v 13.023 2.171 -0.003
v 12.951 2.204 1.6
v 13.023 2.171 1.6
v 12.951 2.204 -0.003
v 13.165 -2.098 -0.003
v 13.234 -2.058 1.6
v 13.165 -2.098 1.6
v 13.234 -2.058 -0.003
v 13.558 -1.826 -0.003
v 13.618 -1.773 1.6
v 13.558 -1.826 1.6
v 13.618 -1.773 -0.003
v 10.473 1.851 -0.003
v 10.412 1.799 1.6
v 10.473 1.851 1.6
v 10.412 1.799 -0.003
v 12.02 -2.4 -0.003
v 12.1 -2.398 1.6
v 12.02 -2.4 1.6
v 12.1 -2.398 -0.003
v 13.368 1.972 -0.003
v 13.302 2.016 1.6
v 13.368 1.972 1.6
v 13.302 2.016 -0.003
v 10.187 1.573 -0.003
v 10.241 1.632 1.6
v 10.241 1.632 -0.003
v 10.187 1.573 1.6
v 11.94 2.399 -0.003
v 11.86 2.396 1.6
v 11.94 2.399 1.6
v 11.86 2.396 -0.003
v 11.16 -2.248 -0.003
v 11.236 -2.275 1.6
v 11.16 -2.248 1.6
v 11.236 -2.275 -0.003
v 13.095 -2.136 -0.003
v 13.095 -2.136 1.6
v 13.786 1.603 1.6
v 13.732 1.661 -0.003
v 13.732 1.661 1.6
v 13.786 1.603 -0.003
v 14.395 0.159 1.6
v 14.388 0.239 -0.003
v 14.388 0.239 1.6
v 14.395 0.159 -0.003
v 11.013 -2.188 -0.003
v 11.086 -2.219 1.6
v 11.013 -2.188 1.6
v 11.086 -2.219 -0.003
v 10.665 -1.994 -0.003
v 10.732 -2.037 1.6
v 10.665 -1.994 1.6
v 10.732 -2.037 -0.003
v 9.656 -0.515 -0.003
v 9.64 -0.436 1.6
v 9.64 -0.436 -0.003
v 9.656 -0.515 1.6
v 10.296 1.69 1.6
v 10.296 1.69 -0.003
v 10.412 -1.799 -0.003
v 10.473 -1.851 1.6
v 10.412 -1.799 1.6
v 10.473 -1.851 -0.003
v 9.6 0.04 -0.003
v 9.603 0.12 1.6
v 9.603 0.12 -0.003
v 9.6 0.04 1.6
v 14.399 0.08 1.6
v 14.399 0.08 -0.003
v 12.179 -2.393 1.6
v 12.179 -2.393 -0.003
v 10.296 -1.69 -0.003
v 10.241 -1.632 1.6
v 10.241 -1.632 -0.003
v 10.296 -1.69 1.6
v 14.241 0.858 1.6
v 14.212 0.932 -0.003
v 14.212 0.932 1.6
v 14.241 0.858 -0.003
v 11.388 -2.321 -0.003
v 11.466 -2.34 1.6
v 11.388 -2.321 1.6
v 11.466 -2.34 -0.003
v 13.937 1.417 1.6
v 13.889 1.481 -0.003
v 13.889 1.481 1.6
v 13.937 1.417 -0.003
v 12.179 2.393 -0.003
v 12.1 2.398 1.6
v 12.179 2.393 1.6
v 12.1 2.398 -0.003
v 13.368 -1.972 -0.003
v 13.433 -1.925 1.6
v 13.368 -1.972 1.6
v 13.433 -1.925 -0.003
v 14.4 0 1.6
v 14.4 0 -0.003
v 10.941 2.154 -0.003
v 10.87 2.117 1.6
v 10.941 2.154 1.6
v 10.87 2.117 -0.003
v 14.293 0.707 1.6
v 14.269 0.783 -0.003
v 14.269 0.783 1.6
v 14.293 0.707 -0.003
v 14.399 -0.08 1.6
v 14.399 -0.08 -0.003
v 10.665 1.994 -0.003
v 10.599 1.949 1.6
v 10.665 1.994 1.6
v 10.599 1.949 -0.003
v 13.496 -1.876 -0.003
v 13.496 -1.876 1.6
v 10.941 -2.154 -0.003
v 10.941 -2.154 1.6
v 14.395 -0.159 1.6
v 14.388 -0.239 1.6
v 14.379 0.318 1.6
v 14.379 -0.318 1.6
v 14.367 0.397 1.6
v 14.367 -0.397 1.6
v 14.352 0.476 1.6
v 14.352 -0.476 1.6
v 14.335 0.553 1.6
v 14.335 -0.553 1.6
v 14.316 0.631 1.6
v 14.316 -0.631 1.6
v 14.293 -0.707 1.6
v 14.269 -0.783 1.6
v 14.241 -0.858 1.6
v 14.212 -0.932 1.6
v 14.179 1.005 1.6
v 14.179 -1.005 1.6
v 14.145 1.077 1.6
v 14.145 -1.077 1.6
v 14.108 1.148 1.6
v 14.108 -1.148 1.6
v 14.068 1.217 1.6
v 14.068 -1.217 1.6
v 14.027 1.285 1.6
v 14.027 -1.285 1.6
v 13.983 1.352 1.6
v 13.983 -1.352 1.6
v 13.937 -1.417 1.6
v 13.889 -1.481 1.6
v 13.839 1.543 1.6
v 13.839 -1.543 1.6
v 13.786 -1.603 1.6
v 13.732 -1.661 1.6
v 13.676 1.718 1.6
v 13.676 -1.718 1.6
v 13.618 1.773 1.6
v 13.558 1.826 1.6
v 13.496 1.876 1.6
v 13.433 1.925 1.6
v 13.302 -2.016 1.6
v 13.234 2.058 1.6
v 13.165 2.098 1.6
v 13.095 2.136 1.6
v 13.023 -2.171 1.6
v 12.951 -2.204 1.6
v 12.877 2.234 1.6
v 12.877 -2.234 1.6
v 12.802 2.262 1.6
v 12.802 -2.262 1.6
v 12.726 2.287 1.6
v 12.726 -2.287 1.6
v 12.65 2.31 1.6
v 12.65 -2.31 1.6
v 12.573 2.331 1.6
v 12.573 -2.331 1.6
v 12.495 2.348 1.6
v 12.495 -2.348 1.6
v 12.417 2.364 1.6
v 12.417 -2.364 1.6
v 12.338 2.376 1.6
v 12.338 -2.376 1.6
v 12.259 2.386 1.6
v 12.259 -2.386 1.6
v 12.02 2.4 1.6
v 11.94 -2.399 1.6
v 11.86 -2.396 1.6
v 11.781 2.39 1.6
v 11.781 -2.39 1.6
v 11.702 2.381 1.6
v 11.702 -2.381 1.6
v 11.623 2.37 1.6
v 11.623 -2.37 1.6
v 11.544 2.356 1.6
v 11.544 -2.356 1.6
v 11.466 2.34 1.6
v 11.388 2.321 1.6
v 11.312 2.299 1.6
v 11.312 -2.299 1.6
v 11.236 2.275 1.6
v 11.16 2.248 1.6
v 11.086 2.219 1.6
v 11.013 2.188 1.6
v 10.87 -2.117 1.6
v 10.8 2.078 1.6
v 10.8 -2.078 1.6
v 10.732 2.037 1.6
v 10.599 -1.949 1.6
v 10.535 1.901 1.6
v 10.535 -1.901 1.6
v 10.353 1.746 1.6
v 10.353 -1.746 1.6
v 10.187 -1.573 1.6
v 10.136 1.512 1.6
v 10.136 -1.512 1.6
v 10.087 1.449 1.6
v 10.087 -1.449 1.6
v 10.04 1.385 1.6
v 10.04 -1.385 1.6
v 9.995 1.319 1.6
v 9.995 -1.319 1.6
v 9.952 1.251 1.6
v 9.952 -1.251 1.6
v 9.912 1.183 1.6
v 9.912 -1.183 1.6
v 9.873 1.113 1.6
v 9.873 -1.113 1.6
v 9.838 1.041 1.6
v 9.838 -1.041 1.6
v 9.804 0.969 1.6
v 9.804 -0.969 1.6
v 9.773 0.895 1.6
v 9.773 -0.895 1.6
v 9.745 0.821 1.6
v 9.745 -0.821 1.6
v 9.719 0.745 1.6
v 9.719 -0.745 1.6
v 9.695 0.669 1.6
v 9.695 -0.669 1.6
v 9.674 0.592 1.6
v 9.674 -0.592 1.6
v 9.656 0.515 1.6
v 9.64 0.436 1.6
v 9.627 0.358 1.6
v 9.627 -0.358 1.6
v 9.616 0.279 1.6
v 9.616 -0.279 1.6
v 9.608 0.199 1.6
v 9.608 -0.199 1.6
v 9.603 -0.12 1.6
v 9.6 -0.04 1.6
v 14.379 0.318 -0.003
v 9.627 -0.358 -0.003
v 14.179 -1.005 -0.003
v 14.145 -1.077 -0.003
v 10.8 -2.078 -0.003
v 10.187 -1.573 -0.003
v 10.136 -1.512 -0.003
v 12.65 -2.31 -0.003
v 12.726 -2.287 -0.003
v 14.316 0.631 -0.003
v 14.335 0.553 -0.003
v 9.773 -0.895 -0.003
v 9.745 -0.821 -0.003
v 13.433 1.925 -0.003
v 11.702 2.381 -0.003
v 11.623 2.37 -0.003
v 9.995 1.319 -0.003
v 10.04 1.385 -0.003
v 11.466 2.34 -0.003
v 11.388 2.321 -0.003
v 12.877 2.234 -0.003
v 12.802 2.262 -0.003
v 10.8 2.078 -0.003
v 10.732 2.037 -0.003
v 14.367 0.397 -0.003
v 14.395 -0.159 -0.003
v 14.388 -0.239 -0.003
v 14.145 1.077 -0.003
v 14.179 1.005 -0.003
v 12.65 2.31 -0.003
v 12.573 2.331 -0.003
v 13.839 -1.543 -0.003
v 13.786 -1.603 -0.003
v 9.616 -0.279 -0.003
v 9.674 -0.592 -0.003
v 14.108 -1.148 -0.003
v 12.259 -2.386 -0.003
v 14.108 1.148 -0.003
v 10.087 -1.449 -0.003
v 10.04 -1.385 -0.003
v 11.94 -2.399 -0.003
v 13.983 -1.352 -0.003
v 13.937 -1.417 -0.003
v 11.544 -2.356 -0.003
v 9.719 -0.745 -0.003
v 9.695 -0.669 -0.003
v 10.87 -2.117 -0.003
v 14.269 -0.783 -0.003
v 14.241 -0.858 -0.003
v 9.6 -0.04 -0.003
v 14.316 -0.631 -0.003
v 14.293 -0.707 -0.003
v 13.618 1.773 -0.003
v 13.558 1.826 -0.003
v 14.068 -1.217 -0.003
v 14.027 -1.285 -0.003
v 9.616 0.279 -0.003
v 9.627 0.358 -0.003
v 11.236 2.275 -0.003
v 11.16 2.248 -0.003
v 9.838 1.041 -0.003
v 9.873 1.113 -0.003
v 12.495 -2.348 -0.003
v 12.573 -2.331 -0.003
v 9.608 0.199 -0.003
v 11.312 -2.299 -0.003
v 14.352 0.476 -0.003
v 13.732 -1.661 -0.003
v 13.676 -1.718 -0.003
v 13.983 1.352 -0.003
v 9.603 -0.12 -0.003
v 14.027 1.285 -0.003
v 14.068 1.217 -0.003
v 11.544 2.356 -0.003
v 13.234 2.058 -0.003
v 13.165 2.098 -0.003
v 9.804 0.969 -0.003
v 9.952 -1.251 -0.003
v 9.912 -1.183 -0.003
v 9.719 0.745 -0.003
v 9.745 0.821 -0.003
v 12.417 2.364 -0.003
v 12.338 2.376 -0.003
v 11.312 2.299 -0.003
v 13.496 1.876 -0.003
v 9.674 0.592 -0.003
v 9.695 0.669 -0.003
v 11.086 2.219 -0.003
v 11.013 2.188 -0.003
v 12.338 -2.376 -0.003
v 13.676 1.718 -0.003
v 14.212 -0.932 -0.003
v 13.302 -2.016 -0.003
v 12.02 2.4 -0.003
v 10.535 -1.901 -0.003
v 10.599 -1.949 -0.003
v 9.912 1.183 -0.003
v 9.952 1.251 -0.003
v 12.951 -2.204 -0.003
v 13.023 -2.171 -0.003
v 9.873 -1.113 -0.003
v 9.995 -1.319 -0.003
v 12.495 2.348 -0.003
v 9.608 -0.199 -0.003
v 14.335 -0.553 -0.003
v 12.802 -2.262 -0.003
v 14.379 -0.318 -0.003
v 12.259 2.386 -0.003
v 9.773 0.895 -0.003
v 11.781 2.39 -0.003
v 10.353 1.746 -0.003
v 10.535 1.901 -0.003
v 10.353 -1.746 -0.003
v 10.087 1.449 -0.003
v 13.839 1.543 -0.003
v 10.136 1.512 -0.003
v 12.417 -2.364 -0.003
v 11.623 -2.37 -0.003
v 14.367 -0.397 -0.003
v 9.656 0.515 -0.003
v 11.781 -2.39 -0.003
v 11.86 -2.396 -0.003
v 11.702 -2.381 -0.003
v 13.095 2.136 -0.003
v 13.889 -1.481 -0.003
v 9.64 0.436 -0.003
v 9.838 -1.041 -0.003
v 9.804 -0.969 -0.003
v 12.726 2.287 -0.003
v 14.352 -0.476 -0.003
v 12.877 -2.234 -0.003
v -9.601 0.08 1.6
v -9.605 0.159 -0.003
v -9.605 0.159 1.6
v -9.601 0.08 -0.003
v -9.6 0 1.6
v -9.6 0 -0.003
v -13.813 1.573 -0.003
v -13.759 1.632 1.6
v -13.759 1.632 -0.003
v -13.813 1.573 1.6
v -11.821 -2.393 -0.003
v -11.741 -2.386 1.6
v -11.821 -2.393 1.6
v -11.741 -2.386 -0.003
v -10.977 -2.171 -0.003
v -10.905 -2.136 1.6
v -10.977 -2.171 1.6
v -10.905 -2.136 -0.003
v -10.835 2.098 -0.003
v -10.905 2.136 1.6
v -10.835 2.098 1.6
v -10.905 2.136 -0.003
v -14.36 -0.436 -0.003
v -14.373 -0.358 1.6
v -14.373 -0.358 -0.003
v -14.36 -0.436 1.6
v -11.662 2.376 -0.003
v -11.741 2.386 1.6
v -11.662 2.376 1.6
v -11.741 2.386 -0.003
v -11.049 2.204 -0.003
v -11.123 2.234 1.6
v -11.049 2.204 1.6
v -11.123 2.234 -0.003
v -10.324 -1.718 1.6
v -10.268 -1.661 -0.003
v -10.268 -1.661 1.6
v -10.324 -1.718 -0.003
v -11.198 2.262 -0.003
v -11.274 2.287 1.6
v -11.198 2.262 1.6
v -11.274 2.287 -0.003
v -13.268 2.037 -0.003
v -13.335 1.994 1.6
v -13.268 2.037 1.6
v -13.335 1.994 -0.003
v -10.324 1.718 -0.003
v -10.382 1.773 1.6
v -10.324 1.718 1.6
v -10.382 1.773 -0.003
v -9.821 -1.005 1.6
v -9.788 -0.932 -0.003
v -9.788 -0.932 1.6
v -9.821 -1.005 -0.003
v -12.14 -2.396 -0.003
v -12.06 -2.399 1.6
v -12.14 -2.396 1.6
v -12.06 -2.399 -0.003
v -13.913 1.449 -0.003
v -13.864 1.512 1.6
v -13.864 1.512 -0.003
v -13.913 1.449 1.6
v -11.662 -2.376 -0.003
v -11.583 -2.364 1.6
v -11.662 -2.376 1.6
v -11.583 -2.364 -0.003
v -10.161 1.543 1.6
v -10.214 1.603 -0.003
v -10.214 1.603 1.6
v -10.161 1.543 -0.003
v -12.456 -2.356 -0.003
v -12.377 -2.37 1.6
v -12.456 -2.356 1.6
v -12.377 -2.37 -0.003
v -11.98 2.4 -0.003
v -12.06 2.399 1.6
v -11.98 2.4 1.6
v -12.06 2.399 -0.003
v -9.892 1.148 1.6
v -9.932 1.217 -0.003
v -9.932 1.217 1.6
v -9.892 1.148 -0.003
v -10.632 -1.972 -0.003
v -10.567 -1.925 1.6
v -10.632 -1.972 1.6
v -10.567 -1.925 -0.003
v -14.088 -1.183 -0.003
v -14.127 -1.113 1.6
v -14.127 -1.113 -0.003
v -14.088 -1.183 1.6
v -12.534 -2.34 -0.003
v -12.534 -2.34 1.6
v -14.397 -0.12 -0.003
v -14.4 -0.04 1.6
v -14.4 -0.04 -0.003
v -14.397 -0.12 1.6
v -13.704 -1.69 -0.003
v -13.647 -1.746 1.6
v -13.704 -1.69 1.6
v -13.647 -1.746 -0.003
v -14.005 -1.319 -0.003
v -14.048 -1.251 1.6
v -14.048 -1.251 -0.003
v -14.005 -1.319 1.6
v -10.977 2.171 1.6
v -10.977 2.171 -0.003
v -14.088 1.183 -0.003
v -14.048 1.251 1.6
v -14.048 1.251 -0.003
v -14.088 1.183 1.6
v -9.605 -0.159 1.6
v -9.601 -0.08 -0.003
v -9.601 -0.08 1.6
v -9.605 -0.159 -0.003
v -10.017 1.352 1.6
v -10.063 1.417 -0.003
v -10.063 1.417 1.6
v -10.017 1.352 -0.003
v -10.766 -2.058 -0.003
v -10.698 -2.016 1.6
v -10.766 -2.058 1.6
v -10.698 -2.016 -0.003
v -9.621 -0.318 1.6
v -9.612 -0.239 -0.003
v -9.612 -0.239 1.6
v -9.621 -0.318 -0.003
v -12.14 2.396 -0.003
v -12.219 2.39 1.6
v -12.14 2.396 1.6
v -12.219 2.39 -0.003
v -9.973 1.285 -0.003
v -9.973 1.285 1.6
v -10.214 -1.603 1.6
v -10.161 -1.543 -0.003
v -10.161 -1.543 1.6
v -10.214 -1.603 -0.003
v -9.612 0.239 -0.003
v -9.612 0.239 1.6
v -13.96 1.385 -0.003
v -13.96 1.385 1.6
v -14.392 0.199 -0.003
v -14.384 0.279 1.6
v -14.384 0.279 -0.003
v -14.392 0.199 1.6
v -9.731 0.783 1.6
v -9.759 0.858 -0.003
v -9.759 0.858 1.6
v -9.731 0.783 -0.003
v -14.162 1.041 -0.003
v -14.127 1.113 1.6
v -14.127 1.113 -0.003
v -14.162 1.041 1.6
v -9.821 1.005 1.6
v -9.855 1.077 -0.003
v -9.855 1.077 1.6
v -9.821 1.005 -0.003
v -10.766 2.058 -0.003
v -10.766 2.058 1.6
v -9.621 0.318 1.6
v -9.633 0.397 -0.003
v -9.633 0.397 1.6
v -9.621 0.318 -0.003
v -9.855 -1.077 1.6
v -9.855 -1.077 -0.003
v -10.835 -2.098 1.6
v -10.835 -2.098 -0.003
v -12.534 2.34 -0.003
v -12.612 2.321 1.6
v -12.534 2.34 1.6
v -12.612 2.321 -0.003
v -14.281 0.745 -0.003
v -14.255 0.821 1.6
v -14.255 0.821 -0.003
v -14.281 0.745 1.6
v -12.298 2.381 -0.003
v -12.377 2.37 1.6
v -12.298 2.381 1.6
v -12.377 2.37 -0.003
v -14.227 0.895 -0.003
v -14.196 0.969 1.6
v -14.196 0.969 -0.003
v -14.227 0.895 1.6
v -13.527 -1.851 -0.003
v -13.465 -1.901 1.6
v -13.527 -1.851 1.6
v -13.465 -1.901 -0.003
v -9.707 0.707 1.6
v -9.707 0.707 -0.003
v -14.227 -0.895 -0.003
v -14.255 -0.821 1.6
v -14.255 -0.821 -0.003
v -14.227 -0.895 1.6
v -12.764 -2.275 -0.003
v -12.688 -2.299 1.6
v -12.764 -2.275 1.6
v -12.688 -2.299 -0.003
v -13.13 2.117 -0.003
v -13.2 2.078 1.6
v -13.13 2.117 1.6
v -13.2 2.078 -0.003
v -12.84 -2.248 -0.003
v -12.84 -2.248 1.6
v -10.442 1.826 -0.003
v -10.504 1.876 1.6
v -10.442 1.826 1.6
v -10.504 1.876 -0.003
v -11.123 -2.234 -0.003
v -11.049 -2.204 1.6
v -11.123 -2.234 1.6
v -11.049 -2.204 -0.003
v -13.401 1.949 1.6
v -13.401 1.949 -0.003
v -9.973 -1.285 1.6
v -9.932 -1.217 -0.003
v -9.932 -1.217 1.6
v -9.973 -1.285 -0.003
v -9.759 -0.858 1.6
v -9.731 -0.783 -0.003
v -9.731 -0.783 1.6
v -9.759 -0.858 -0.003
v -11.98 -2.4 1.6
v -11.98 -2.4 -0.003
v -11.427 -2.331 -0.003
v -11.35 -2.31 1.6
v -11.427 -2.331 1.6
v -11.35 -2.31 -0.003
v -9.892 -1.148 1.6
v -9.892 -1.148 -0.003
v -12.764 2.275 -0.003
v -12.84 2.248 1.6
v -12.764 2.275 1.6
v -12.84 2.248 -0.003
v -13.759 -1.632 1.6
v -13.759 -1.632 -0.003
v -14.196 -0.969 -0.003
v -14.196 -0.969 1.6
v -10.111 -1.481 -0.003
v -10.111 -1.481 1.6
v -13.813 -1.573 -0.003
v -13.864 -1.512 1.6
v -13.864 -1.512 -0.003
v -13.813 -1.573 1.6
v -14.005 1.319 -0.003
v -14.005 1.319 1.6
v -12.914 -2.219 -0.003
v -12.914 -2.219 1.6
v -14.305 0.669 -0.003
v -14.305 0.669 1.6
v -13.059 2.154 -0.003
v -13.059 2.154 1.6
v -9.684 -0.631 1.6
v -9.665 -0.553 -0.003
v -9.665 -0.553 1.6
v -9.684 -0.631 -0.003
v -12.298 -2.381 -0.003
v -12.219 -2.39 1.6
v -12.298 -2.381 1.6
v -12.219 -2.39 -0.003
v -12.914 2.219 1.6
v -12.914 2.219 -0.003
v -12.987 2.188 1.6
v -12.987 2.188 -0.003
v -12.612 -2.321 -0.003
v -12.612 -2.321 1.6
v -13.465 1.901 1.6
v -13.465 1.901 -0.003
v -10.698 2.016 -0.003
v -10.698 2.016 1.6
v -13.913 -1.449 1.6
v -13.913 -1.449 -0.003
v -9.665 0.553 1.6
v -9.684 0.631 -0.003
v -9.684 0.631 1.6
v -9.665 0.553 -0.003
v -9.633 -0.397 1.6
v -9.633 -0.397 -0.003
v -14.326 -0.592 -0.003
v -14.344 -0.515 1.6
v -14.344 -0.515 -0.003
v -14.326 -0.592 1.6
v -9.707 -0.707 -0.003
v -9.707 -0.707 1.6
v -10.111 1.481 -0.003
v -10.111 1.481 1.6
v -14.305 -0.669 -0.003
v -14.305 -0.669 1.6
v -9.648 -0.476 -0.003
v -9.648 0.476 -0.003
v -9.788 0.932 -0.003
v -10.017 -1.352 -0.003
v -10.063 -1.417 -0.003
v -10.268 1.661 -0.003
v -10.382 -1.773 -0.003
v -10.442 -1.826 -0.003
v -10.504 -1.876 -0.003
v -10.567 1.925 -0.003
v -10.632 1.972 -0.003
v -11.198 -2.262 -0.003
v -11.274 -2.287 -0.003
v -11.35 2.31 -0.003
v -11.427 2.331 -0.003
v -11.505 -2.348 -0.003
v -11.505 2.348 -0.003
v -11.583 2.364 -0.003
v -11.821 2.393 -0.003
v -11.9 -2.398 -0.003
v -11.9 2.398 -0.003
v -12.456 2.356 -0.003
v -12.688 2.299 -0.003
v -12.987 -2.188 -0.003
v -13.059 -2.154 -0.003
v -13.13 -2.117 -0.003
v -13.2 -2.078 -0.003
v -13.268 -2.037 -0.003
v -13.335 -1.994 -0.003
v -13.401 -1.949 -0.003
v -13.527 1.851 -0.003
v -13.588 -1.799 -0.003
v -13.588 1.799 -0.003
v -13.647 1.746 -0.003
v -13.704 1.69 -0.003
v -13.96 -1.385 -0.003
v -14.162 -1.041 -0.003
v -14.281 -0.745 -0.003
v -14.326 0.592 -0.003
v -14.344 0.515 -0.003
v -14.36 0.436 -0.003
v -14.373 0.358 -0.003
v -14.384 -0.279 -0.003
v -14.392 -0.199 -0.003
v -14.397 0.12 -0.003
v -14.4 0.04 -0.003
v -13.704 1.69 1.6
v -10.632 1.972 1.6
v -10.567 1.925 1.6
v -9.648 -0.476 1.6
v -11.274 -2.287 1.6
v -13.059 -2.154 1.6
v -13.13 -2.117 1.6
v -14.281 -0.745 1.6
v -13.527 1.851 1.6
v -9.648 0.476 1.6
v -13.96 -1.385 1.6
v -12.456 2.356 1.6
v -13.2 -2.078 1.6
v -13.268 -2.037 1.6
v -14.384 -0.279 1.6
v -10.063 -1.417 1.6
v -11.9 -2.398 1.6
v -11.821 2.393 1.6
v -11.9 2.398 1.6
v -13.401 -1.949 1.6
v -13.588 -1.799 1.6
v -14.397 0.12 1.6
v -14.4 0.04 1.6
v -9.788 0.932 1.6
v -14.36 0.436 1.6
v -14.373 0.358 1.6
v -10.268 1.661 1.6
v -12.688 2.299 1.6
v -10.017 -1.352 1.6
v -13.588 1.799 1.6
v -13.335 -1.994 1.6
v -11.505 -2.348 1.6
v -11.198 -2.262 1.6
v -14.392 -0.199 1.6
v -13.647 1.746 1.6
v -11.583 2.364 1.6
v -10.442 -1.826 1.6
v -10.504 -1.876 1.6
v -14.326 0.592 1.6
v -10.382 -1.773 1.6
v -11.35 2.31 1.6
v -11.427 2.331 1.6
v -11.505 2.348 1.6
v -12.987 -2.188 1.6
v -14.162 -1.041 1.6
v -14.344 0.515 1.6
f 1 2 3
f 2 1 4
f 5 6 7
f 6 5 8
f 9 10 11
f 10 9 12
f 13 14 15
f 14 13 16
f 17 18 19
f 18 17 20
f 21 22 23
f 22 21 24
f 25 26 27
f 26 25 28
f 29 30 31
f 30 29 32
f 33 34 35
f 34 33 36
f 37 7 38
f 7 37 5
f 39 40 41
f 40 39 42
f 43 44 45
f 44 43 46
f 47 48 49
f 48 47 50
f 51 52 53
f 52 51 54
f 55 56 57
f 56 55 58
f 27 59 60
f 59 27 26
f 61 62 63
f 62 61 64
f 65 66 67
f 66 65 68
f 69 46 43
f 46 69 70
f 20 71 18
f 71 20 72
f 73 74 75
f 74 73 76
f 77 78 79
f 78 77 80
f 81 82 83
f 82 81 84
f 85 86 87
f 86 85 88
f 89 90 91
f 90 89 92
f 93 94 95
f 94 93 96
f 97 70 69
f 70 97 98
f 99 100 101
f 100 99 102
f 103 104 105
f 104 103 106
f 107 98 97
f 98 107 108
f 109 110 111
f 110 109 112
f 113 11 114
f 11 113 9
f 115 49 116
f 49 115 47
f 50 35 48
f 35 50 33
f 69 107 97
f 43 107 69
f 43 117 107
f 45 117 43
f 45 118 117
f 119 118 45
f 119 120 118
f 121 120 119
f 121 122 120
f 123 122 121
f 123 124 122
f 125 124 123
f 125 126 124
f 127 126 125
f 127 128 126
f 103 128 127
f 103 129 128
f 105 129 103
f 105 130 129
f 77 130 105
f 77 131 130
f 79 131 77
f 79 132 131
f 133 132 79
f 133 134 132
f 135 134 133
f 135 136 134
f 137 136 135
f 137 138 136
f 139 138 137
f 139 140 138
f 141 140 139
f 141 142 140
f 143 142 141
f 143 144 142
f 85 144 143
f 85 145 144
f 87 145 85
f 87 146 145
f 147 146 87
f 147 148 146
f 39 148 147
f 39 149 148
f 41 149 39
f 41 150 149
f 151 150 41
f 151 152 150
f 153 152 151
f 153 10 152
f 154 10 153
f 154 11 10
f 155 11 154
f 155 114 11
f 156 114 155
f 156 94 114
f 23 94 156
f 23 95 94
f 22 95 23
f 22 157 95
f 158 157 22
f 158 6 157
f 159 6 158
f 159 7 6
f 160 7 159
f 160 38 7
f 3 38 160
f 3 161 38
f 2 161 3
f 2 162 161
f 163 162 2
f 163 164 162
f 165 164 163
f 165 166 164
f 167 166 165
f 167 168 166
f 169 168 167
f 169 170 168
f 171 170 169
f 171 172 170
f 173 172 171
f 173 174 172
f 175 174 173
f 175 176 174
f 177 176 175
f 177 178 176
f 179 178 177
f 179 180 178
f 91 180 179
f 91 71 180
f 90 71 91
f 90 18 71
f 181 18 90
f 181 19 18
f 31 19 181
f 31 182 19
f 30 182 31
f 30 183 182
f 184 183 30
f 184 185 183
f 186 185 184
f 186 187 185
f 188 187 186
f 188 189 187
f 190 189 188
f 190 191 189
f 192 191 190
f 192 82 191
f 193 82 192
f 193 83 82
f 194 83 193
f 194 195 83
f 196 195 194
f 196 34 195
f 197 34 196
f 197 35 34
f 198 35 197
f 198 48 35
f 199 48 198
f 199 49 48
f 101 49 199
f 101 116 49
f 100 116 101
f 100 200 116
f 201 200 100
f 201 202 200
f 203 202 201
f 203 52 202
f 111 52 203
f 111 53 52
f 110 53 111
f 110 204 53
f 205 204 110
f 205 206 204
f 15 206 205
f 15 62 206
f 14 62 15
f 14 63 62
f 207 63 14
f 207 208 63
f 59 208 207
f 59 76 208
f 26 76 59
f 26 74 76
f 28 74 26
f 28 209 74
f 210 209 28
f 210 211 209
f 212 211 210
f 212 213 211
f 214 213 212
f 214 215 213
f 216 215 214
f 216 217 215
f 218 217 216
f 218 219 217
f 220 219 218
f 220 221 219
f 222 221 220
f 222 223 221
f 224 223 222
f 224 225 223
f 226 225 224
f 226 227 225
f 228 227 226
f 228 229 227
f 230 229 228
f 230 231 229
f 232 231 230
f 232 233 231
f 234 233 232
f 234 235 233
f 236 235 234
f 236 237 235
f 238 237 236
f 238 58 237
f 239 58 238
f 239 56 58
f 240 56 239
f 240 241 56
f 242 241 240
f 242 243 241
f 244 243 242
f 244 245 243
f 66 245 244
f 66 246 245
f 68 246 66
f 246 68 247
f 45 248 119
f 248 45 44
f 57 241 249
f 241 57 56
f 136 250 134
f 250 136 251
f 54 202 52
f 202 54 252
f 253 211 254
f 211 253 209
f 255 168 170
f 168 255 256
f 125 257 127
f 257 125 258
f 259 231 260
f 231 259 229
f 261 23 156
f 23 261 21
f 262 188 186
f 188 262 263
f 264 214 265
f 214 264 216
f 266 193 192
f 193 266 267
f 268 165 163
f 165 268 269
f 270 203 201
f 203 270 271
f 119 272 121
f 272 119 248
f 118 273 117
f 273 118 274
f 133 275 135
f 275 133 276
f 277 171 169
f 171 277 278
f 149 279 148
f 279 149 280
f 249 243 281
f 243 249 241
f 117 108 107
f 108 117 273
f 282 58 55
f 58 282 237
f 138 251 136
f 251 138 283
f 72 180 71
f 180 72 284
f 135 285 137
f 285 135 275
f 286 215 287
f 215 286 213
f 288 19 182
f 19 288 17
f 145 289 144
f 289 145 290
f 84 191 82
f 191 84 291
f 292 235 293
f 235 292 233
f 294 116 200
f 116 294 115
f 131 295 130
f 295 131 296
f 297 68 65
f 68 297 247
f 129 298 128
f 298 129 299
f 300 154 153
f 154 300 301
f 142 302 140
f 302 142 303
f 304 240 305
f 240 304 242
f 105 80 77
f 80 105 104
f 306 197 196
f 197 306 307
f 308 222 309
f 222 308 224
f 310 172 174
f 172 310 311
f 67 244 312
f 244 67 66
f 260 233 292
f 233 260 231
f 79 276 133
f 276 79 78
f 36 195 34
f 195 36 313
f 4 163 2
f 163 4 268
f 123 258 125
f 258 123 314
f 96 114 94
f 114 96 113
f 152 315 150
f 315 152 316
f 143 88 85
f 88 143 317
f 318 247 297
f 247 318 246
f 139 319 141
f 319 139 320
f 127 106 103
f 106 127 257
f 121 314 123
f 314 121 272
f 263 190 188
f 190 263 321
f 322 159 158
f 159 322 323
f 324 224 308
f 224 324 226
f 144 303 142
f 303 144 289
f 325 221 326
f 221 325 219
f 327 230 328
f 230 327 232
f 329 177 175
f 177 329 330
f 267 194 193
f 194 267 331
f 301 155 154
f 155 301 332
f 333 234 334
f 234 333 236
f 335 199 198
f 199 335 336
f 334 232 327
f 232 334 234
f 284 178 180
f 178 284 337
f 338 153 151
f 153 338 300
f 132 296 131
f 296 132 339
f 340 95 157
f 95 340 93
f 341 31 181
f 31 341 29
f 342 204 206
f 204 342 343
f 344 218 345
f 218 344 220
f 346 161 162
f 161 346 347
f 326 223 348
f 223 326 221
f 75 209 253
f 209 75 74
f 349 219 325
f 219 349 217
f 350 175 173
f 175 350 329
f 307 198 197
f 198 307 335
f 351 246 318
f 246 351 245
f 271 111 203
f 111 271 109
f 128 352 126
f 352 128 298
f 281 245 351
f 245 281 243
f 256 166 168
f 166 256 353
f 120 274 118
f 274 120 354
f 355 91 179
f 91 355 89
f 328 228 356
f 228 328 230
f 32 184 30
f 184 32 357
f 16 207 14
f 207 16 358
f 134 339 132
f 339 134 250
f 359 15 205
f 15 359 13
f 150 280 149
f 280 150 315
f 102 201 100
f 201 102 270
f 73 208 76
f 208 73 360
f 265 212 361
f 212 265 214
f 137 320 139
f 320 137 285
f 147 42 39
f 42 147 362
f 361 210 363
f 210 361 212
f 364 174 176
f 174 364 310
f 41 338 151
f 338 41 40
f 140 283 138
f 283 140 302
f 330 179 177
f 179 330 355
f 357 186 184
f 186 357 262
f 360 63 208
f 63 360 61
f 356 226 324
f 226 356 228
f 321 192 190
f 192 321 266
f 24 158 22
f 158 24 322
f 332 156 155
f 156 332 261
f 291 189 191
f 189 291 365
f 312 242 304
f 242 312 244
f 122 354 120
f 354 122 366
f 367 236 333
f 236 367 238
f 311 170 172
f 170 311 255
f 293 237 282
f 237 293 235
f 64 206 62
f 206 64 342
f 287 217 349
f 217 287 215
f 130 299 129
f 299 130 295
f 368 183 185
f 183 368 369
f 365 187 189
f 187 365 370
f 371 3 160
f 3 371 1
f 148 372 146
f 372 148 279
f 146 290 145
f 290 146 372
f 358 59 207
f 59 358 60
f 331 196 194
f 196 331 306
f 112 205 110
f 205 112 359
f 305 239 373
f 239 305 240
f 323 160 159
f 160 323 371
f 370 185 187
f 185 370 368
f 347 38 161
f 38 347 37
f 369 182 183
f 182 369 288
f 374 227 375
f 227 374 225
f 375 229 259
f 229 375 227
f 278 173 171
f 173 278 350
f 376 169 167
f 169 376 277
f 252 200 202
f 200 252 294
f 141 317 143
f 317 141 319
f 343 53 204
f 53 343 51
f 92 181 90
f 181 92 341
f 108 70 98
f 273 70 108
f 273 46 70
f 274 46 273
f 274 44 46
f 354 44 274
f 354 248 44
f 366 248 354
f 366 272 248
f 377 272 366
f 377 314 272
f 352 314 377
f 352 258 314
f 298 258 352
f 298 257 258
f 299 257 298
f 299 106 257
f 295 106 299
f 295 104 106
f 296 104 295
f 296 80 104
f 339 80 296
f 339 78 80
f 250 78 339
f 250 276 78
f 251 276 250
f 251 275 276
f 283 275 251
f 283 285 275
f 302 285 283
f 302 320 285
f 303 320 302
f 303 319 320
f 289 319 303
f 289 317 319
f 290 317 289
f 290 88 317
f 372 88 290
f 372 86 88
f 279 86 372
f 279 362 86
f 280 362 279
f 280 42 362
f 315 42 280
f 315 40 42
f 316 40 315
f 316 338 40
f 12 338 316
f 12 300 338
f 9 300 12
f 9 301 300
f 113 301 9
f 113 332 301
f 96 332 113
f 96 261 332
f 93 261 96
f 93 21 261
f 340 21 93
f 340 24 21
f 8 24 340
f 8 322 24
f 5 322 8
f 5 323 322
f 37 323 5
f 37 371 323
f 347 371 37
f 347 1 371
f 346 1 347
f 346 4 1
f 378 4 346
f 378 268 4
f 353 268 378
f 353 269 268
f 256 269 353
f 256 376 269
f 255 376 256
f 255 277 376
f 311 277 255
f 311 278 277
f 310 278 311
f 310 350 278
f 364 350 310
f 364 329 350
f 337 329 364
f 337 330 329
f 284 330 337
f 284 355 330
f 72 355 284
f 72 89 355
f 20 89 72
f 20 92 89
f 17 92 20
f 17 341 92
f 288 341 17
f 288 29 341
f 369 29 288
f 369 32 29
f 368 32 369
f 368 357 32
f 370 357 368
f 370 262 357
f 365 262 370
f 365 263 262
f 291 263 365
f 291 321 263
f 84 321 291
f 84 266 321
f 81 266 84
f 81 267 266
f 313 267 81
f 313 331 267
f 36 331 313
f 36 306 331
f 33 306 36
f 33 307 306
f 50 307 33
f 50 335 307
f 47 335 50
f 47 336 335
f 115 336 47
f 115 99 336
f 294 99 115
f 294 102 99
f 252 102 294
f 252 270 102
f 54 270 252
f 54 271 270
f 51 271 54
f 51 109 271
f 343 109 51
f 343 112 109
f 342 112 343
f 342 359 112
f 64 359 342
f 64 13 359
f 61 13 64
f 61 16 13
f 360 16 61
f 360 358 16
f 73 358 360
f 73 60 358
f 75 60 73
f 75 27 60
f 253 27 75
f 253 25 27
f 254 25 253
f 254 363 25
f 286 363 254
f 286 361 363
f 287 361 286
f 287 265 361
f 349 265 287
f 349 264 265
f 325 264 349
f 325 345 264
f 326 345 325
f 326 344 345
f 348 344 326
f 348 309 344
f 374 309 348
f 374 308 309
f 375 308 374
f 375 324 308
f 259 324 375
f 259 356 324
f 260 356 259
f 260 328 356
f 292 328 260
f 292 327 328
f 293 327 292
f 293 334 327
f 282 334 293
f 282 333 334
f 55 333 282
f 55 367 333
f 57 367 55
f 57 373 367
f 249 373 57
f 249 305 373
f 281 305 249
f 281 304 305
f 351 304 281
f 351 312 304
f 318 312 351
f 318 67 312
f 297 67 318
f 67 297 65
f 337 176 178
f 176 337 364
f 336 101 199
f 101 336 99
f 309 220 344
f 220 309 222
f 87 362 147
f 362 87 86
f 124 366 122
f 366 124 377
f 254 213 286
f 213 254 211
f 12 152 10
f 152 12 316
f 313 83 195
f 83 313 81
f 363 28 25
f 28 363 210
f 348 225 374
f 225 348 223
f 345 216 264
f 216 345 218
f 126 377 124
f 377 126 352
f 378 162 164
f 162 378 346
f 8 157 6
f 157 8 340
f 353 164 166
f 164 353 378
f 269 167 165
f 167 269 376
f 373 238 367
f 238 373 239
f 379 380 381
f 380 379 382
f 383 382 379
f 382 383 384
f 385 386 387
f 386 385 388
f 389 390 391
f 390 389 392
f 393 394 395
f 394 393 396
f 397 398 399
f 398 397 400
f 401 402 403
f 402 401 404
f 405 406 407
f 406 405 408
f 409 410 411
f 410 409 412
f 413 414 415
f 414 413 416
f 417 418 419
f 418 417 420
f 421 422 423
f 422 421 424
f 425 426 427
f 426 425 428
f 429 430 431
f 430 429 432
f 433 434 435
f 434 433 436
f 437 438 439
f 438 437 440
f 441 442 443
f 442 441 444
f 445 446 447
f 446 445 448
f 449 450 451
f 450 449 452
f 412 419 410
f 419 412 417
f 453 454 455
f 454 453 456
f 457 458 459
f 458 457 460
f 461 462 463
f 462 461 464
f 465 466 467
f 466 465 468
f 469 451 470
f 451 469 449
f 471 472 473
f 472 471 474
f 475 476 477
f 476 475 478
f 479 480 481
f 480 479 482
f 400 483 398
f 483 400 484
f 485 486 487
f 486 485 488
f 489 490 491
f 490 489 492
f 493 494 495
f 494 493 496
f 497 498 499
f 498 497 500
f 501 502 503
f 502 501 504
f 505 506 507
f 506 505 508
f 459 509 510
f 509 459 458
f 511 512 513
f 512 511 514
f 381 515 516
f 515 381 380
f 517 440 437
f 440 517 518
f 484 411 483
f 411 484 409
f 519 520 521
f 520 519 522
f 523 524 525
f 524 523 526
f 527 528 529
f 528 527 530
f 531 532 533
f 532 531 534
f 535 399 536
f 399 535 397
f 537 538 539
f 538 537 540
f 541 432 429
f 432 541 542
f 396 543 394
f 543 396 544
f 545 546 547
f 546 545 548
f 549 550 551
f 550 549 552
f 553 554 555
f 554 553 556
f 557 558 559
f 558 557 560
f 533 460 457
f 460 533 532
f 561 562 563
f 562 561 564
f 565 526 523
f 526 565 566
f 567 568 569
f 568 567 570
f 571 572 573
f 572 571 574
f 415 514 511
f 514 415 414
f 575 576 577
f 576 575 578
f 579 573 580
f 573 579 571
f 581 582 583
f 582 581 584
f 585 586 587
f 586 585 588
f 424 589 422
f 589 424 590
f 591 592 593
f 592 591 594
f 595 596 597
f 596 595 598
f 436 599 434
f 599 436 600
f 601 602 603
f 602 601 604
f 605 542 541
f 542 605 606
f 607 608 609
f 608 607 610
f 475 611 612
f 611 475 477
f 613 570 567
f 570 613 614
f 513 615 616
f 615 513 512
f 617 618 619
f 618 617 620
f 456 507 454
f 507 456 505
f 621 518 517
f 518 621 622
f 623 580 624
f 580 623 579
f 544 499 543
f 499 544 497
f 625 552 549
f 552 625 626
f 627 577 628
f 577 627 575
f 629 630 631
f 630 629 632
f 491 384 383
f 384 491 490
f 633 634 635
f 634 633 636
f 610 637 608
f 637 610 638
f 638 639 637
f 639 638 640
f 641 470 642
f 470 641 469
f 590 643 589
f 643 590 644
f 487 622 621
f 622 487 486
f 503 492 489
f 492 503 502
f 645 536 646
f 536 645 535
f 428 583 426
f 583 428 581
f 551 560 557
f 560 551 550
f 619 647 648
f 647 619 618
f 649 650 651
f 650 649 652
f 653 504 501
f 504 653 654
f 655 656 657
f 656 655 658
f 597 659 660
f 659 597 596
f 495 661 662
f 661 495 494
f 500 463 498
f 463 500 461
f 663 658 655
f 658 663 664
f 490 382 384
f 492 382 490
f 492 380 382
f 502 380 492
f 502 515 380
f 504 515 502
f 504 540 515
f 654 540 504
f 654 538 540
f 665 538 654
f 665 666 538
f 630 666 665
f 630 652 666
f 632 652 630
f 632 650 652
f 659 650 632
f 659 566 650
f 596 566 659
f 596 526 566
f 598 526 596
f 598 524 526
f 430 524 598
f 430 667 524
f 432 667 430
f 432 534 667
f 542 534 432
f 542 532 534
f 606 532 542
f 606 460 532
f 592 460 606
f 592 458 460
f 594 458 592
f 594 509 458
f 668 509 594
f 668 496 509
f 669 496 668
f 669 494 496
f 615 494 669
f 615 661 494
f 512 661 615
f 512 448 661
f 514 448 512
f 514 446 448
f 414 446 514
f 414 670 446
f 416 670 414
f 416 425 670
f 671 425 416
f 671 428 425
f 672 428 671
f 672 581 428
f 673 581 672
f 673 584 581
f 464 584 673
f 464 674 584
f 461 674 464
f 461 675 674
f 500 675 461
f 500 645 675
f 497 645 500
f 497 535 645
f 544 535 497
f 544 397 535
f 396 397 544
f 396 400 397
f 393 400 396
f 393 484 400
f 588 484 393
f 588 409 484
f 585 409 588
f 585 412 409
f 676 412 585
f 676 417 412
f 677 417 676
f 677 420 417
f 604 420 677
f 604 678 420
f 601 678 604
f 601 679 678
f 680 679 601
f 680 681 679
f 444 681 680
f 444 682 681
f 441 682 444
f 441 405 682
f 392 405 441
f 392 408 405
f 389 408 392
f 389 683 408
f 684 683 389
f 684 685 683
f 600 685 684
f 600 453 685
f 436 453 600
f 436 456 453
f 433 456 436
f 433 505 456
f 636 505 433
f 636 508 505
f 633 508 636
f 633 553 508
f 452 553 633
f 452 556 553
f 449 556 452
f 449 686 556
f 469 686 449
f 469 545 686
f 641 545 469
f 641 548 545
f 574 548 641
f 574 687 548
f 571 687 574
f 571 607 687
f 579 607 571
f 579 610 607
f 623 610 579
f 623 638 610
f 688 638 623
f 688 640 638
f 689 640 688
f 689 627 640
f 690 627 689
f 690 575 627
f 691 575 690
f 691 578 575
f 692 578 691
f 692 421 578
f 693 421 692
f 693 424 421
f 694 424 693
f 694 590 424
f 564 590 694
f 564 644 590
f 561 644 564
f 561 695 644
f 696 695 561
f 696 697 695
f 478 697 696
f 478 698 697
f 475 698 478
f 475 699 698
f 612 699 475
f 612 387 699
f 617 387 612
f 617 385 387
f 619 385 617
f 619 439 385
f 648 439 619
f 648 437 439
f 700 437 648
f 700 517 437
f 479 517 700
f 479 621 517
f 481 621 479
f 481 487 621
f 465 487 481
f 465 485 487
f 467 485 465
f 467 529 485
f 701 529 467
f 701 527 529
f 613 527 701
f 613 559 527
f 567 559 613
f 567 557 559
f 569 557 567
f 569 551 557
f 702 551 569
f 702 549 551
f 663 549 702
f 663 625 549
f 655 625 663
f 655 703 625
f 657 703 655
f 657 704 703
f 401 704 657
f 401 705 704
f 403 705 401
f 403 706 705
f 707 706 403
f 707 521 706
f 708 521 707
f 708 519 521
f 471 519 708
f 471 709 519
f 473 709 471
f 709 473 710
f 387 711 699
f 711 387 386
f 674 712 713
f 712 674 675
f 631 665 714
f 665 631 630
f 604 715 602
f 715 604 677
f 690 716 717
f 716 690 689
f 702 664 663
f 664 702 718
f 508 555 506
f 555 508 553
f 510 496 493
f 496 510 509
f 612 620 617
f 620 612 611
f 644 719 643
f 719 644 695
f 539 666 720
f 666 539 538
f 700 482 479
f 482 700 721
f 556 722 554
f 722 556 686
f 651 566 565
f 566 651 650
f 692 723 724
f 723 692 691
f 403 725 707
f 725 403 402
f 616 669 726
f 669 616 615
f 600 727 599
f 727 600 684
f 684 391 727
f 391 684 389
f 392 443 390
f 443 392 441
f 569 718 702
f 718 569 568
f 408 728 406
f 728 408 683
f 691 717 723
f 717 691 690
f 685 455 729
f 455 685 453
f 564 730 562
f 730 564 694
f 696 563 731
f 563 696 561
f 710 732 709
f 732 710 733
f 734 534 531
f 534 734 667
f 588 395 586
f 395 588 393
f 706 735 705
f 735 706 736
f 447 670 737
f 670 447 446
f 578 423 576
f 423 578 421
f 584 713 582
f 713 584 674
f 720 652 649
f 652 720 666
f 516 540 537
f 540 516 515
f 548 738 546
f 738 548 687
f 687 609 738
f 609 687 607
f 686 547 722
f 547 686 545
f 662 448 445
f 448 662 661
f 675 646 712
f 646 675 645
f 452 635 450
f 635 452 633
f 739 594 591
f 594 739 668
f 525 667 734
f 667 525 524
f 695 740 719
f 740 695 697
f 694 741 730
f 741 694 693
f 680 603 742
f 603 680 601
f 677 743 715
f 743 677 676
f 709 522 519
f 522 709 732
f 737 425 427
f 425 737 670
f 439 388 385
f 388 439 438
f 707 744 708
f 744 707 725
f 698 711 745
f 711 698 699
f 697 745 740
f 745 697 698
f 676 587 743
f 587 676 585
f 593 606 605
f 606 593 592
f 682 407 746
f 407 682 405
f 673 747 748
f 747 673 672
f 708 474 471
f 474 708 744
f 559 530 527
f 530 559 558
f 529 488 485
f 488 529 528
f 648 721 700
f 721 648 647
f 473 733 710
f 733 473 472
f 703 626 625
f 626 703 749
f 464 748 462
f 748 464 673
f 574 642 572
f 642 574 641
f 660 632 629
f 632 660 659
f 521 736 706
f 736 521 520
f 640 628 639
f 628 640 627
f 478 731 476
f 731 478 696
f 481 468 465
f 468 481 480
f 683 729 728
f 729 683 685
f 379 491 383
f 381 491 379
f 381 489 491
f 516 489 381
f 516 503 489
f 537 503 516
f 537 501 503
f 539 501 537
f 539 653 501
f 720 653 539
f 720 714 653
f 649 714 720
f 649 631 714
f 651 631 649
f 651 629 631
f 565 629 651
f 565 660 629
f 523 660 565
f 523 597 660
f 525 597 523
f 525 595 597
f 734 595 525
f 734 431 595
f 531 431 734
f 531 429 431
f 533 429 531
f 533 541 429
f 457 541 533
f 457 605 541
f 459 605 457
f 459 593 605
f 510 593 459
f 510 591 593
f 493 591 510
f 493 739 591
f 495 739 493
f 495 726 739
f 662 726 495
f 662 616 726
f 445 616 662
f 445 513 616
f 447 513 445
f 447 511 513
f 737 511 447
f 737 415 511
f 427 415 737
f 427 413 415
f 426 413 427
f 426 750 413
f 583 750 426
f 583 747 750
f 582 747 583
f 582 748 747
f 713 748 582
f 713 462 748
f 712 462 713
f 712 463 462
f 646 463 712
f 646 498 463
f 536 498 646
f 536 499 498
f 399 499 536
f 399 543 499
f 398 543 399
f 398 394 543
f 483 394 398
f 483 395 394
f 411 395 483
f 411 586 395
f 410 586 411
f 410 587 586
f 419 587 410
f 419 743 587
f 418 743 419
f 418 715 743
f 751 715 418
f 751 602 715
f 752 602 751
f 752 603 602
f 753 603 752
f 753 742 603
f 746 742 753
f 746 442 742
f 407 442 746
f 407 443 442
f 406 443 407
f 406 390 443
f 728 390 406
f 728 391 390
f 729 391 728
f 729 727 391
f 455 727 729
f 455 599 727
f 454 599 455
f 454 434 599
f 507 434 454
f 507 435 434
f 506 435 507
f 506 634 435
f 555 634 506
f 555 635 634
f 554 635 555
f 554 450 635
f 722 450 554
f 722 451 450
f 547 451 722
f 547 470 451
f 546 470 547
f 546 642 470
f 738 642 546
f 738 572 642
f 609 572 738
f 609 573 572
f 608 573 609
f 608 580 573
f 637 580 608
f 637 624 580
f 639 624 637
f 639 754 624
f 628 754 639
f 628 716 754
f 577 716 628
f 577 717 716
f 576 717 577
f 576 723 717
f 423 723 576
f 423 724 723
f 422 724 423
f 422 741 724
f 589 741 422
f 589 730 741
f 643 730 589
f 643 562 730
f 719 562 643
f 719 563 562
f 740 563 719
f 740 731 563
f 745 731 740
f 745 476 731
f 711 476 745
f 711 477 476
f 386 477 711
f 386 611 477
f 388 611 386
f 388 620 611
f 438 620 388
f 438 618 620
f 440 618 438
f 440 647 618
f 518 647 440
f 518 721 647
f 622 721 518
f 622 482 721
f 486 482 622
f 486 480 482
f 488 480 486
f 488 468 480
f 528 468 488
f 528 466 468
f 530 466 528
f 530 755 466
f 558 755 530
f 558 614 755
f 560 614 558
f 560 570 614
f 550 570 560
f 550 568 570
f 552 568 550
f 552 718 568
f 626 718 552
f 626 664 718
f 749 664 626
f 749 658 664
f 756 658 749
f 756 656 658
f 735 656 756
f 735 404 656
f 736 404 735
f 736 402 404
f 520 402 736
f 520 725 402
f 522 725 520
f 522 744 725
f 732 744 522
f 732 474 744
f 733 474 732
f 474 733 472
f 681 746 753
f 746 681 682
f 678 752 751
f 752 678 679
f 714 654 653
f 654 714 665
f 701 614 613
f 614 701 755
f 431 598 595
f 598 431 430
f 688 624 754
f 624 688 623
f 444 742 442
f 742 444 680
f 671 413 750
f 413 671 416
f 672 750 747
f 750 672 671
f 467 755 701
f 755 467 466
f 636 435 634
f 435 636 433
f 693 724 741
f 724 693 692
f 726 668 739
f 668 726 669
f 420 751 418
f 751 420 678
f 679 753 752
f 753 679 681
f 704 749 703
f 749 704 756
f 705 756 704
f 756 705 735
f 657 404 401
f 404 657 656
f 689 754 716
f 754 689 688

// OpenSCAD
use <../../lib.scad>
use <93348s01.scad>
$fa=1; $fs=0.2;
function ldraw_lib__s__u9046s01(realsolid=false) = [
// 0 ~Moved to s\93348s01
// 0 Name: s\u9046s01.dat
// 0 Author: [PTadmin]
// 0 !LDRAW_ORG Subpart UPDATE 2013-02
// 0 !LICENSE Licensed under CC BY 4.0 : see CAreadme.txt
// 
// 0 BFC CERTIFY CCW
  [0,"BFC","CERTIFY"],
  [0,"BFC","CCW"],
// 
// 0 !HISTORY 2013-12-23 [PTadmin] Official Update 2013-02
// 
// 
// 0 // ~Wedge 4 x 4 with Stud Notches without Front Face
// 1 16 0 0 0 1 0 0 0 1 0 0 0 1 s\93348s01.dat
  [1,16,0,0,0,1,0,0,0,1,0,0,0,1, ldraw_lib__s__93348s01(realsolid)],
];
module ldraw_lib__s__u9046s01(step=0, col=false, unit=2/5, alt=false, line=0.2, solid=!$preview)
    makepoly(ldraw_lib__s__u9046s01(solid), step=step, col=col, unit=unit, alt=alt, line=line, solid=solid);
ldraw_lib__s__u9046s01(line=0.2);
